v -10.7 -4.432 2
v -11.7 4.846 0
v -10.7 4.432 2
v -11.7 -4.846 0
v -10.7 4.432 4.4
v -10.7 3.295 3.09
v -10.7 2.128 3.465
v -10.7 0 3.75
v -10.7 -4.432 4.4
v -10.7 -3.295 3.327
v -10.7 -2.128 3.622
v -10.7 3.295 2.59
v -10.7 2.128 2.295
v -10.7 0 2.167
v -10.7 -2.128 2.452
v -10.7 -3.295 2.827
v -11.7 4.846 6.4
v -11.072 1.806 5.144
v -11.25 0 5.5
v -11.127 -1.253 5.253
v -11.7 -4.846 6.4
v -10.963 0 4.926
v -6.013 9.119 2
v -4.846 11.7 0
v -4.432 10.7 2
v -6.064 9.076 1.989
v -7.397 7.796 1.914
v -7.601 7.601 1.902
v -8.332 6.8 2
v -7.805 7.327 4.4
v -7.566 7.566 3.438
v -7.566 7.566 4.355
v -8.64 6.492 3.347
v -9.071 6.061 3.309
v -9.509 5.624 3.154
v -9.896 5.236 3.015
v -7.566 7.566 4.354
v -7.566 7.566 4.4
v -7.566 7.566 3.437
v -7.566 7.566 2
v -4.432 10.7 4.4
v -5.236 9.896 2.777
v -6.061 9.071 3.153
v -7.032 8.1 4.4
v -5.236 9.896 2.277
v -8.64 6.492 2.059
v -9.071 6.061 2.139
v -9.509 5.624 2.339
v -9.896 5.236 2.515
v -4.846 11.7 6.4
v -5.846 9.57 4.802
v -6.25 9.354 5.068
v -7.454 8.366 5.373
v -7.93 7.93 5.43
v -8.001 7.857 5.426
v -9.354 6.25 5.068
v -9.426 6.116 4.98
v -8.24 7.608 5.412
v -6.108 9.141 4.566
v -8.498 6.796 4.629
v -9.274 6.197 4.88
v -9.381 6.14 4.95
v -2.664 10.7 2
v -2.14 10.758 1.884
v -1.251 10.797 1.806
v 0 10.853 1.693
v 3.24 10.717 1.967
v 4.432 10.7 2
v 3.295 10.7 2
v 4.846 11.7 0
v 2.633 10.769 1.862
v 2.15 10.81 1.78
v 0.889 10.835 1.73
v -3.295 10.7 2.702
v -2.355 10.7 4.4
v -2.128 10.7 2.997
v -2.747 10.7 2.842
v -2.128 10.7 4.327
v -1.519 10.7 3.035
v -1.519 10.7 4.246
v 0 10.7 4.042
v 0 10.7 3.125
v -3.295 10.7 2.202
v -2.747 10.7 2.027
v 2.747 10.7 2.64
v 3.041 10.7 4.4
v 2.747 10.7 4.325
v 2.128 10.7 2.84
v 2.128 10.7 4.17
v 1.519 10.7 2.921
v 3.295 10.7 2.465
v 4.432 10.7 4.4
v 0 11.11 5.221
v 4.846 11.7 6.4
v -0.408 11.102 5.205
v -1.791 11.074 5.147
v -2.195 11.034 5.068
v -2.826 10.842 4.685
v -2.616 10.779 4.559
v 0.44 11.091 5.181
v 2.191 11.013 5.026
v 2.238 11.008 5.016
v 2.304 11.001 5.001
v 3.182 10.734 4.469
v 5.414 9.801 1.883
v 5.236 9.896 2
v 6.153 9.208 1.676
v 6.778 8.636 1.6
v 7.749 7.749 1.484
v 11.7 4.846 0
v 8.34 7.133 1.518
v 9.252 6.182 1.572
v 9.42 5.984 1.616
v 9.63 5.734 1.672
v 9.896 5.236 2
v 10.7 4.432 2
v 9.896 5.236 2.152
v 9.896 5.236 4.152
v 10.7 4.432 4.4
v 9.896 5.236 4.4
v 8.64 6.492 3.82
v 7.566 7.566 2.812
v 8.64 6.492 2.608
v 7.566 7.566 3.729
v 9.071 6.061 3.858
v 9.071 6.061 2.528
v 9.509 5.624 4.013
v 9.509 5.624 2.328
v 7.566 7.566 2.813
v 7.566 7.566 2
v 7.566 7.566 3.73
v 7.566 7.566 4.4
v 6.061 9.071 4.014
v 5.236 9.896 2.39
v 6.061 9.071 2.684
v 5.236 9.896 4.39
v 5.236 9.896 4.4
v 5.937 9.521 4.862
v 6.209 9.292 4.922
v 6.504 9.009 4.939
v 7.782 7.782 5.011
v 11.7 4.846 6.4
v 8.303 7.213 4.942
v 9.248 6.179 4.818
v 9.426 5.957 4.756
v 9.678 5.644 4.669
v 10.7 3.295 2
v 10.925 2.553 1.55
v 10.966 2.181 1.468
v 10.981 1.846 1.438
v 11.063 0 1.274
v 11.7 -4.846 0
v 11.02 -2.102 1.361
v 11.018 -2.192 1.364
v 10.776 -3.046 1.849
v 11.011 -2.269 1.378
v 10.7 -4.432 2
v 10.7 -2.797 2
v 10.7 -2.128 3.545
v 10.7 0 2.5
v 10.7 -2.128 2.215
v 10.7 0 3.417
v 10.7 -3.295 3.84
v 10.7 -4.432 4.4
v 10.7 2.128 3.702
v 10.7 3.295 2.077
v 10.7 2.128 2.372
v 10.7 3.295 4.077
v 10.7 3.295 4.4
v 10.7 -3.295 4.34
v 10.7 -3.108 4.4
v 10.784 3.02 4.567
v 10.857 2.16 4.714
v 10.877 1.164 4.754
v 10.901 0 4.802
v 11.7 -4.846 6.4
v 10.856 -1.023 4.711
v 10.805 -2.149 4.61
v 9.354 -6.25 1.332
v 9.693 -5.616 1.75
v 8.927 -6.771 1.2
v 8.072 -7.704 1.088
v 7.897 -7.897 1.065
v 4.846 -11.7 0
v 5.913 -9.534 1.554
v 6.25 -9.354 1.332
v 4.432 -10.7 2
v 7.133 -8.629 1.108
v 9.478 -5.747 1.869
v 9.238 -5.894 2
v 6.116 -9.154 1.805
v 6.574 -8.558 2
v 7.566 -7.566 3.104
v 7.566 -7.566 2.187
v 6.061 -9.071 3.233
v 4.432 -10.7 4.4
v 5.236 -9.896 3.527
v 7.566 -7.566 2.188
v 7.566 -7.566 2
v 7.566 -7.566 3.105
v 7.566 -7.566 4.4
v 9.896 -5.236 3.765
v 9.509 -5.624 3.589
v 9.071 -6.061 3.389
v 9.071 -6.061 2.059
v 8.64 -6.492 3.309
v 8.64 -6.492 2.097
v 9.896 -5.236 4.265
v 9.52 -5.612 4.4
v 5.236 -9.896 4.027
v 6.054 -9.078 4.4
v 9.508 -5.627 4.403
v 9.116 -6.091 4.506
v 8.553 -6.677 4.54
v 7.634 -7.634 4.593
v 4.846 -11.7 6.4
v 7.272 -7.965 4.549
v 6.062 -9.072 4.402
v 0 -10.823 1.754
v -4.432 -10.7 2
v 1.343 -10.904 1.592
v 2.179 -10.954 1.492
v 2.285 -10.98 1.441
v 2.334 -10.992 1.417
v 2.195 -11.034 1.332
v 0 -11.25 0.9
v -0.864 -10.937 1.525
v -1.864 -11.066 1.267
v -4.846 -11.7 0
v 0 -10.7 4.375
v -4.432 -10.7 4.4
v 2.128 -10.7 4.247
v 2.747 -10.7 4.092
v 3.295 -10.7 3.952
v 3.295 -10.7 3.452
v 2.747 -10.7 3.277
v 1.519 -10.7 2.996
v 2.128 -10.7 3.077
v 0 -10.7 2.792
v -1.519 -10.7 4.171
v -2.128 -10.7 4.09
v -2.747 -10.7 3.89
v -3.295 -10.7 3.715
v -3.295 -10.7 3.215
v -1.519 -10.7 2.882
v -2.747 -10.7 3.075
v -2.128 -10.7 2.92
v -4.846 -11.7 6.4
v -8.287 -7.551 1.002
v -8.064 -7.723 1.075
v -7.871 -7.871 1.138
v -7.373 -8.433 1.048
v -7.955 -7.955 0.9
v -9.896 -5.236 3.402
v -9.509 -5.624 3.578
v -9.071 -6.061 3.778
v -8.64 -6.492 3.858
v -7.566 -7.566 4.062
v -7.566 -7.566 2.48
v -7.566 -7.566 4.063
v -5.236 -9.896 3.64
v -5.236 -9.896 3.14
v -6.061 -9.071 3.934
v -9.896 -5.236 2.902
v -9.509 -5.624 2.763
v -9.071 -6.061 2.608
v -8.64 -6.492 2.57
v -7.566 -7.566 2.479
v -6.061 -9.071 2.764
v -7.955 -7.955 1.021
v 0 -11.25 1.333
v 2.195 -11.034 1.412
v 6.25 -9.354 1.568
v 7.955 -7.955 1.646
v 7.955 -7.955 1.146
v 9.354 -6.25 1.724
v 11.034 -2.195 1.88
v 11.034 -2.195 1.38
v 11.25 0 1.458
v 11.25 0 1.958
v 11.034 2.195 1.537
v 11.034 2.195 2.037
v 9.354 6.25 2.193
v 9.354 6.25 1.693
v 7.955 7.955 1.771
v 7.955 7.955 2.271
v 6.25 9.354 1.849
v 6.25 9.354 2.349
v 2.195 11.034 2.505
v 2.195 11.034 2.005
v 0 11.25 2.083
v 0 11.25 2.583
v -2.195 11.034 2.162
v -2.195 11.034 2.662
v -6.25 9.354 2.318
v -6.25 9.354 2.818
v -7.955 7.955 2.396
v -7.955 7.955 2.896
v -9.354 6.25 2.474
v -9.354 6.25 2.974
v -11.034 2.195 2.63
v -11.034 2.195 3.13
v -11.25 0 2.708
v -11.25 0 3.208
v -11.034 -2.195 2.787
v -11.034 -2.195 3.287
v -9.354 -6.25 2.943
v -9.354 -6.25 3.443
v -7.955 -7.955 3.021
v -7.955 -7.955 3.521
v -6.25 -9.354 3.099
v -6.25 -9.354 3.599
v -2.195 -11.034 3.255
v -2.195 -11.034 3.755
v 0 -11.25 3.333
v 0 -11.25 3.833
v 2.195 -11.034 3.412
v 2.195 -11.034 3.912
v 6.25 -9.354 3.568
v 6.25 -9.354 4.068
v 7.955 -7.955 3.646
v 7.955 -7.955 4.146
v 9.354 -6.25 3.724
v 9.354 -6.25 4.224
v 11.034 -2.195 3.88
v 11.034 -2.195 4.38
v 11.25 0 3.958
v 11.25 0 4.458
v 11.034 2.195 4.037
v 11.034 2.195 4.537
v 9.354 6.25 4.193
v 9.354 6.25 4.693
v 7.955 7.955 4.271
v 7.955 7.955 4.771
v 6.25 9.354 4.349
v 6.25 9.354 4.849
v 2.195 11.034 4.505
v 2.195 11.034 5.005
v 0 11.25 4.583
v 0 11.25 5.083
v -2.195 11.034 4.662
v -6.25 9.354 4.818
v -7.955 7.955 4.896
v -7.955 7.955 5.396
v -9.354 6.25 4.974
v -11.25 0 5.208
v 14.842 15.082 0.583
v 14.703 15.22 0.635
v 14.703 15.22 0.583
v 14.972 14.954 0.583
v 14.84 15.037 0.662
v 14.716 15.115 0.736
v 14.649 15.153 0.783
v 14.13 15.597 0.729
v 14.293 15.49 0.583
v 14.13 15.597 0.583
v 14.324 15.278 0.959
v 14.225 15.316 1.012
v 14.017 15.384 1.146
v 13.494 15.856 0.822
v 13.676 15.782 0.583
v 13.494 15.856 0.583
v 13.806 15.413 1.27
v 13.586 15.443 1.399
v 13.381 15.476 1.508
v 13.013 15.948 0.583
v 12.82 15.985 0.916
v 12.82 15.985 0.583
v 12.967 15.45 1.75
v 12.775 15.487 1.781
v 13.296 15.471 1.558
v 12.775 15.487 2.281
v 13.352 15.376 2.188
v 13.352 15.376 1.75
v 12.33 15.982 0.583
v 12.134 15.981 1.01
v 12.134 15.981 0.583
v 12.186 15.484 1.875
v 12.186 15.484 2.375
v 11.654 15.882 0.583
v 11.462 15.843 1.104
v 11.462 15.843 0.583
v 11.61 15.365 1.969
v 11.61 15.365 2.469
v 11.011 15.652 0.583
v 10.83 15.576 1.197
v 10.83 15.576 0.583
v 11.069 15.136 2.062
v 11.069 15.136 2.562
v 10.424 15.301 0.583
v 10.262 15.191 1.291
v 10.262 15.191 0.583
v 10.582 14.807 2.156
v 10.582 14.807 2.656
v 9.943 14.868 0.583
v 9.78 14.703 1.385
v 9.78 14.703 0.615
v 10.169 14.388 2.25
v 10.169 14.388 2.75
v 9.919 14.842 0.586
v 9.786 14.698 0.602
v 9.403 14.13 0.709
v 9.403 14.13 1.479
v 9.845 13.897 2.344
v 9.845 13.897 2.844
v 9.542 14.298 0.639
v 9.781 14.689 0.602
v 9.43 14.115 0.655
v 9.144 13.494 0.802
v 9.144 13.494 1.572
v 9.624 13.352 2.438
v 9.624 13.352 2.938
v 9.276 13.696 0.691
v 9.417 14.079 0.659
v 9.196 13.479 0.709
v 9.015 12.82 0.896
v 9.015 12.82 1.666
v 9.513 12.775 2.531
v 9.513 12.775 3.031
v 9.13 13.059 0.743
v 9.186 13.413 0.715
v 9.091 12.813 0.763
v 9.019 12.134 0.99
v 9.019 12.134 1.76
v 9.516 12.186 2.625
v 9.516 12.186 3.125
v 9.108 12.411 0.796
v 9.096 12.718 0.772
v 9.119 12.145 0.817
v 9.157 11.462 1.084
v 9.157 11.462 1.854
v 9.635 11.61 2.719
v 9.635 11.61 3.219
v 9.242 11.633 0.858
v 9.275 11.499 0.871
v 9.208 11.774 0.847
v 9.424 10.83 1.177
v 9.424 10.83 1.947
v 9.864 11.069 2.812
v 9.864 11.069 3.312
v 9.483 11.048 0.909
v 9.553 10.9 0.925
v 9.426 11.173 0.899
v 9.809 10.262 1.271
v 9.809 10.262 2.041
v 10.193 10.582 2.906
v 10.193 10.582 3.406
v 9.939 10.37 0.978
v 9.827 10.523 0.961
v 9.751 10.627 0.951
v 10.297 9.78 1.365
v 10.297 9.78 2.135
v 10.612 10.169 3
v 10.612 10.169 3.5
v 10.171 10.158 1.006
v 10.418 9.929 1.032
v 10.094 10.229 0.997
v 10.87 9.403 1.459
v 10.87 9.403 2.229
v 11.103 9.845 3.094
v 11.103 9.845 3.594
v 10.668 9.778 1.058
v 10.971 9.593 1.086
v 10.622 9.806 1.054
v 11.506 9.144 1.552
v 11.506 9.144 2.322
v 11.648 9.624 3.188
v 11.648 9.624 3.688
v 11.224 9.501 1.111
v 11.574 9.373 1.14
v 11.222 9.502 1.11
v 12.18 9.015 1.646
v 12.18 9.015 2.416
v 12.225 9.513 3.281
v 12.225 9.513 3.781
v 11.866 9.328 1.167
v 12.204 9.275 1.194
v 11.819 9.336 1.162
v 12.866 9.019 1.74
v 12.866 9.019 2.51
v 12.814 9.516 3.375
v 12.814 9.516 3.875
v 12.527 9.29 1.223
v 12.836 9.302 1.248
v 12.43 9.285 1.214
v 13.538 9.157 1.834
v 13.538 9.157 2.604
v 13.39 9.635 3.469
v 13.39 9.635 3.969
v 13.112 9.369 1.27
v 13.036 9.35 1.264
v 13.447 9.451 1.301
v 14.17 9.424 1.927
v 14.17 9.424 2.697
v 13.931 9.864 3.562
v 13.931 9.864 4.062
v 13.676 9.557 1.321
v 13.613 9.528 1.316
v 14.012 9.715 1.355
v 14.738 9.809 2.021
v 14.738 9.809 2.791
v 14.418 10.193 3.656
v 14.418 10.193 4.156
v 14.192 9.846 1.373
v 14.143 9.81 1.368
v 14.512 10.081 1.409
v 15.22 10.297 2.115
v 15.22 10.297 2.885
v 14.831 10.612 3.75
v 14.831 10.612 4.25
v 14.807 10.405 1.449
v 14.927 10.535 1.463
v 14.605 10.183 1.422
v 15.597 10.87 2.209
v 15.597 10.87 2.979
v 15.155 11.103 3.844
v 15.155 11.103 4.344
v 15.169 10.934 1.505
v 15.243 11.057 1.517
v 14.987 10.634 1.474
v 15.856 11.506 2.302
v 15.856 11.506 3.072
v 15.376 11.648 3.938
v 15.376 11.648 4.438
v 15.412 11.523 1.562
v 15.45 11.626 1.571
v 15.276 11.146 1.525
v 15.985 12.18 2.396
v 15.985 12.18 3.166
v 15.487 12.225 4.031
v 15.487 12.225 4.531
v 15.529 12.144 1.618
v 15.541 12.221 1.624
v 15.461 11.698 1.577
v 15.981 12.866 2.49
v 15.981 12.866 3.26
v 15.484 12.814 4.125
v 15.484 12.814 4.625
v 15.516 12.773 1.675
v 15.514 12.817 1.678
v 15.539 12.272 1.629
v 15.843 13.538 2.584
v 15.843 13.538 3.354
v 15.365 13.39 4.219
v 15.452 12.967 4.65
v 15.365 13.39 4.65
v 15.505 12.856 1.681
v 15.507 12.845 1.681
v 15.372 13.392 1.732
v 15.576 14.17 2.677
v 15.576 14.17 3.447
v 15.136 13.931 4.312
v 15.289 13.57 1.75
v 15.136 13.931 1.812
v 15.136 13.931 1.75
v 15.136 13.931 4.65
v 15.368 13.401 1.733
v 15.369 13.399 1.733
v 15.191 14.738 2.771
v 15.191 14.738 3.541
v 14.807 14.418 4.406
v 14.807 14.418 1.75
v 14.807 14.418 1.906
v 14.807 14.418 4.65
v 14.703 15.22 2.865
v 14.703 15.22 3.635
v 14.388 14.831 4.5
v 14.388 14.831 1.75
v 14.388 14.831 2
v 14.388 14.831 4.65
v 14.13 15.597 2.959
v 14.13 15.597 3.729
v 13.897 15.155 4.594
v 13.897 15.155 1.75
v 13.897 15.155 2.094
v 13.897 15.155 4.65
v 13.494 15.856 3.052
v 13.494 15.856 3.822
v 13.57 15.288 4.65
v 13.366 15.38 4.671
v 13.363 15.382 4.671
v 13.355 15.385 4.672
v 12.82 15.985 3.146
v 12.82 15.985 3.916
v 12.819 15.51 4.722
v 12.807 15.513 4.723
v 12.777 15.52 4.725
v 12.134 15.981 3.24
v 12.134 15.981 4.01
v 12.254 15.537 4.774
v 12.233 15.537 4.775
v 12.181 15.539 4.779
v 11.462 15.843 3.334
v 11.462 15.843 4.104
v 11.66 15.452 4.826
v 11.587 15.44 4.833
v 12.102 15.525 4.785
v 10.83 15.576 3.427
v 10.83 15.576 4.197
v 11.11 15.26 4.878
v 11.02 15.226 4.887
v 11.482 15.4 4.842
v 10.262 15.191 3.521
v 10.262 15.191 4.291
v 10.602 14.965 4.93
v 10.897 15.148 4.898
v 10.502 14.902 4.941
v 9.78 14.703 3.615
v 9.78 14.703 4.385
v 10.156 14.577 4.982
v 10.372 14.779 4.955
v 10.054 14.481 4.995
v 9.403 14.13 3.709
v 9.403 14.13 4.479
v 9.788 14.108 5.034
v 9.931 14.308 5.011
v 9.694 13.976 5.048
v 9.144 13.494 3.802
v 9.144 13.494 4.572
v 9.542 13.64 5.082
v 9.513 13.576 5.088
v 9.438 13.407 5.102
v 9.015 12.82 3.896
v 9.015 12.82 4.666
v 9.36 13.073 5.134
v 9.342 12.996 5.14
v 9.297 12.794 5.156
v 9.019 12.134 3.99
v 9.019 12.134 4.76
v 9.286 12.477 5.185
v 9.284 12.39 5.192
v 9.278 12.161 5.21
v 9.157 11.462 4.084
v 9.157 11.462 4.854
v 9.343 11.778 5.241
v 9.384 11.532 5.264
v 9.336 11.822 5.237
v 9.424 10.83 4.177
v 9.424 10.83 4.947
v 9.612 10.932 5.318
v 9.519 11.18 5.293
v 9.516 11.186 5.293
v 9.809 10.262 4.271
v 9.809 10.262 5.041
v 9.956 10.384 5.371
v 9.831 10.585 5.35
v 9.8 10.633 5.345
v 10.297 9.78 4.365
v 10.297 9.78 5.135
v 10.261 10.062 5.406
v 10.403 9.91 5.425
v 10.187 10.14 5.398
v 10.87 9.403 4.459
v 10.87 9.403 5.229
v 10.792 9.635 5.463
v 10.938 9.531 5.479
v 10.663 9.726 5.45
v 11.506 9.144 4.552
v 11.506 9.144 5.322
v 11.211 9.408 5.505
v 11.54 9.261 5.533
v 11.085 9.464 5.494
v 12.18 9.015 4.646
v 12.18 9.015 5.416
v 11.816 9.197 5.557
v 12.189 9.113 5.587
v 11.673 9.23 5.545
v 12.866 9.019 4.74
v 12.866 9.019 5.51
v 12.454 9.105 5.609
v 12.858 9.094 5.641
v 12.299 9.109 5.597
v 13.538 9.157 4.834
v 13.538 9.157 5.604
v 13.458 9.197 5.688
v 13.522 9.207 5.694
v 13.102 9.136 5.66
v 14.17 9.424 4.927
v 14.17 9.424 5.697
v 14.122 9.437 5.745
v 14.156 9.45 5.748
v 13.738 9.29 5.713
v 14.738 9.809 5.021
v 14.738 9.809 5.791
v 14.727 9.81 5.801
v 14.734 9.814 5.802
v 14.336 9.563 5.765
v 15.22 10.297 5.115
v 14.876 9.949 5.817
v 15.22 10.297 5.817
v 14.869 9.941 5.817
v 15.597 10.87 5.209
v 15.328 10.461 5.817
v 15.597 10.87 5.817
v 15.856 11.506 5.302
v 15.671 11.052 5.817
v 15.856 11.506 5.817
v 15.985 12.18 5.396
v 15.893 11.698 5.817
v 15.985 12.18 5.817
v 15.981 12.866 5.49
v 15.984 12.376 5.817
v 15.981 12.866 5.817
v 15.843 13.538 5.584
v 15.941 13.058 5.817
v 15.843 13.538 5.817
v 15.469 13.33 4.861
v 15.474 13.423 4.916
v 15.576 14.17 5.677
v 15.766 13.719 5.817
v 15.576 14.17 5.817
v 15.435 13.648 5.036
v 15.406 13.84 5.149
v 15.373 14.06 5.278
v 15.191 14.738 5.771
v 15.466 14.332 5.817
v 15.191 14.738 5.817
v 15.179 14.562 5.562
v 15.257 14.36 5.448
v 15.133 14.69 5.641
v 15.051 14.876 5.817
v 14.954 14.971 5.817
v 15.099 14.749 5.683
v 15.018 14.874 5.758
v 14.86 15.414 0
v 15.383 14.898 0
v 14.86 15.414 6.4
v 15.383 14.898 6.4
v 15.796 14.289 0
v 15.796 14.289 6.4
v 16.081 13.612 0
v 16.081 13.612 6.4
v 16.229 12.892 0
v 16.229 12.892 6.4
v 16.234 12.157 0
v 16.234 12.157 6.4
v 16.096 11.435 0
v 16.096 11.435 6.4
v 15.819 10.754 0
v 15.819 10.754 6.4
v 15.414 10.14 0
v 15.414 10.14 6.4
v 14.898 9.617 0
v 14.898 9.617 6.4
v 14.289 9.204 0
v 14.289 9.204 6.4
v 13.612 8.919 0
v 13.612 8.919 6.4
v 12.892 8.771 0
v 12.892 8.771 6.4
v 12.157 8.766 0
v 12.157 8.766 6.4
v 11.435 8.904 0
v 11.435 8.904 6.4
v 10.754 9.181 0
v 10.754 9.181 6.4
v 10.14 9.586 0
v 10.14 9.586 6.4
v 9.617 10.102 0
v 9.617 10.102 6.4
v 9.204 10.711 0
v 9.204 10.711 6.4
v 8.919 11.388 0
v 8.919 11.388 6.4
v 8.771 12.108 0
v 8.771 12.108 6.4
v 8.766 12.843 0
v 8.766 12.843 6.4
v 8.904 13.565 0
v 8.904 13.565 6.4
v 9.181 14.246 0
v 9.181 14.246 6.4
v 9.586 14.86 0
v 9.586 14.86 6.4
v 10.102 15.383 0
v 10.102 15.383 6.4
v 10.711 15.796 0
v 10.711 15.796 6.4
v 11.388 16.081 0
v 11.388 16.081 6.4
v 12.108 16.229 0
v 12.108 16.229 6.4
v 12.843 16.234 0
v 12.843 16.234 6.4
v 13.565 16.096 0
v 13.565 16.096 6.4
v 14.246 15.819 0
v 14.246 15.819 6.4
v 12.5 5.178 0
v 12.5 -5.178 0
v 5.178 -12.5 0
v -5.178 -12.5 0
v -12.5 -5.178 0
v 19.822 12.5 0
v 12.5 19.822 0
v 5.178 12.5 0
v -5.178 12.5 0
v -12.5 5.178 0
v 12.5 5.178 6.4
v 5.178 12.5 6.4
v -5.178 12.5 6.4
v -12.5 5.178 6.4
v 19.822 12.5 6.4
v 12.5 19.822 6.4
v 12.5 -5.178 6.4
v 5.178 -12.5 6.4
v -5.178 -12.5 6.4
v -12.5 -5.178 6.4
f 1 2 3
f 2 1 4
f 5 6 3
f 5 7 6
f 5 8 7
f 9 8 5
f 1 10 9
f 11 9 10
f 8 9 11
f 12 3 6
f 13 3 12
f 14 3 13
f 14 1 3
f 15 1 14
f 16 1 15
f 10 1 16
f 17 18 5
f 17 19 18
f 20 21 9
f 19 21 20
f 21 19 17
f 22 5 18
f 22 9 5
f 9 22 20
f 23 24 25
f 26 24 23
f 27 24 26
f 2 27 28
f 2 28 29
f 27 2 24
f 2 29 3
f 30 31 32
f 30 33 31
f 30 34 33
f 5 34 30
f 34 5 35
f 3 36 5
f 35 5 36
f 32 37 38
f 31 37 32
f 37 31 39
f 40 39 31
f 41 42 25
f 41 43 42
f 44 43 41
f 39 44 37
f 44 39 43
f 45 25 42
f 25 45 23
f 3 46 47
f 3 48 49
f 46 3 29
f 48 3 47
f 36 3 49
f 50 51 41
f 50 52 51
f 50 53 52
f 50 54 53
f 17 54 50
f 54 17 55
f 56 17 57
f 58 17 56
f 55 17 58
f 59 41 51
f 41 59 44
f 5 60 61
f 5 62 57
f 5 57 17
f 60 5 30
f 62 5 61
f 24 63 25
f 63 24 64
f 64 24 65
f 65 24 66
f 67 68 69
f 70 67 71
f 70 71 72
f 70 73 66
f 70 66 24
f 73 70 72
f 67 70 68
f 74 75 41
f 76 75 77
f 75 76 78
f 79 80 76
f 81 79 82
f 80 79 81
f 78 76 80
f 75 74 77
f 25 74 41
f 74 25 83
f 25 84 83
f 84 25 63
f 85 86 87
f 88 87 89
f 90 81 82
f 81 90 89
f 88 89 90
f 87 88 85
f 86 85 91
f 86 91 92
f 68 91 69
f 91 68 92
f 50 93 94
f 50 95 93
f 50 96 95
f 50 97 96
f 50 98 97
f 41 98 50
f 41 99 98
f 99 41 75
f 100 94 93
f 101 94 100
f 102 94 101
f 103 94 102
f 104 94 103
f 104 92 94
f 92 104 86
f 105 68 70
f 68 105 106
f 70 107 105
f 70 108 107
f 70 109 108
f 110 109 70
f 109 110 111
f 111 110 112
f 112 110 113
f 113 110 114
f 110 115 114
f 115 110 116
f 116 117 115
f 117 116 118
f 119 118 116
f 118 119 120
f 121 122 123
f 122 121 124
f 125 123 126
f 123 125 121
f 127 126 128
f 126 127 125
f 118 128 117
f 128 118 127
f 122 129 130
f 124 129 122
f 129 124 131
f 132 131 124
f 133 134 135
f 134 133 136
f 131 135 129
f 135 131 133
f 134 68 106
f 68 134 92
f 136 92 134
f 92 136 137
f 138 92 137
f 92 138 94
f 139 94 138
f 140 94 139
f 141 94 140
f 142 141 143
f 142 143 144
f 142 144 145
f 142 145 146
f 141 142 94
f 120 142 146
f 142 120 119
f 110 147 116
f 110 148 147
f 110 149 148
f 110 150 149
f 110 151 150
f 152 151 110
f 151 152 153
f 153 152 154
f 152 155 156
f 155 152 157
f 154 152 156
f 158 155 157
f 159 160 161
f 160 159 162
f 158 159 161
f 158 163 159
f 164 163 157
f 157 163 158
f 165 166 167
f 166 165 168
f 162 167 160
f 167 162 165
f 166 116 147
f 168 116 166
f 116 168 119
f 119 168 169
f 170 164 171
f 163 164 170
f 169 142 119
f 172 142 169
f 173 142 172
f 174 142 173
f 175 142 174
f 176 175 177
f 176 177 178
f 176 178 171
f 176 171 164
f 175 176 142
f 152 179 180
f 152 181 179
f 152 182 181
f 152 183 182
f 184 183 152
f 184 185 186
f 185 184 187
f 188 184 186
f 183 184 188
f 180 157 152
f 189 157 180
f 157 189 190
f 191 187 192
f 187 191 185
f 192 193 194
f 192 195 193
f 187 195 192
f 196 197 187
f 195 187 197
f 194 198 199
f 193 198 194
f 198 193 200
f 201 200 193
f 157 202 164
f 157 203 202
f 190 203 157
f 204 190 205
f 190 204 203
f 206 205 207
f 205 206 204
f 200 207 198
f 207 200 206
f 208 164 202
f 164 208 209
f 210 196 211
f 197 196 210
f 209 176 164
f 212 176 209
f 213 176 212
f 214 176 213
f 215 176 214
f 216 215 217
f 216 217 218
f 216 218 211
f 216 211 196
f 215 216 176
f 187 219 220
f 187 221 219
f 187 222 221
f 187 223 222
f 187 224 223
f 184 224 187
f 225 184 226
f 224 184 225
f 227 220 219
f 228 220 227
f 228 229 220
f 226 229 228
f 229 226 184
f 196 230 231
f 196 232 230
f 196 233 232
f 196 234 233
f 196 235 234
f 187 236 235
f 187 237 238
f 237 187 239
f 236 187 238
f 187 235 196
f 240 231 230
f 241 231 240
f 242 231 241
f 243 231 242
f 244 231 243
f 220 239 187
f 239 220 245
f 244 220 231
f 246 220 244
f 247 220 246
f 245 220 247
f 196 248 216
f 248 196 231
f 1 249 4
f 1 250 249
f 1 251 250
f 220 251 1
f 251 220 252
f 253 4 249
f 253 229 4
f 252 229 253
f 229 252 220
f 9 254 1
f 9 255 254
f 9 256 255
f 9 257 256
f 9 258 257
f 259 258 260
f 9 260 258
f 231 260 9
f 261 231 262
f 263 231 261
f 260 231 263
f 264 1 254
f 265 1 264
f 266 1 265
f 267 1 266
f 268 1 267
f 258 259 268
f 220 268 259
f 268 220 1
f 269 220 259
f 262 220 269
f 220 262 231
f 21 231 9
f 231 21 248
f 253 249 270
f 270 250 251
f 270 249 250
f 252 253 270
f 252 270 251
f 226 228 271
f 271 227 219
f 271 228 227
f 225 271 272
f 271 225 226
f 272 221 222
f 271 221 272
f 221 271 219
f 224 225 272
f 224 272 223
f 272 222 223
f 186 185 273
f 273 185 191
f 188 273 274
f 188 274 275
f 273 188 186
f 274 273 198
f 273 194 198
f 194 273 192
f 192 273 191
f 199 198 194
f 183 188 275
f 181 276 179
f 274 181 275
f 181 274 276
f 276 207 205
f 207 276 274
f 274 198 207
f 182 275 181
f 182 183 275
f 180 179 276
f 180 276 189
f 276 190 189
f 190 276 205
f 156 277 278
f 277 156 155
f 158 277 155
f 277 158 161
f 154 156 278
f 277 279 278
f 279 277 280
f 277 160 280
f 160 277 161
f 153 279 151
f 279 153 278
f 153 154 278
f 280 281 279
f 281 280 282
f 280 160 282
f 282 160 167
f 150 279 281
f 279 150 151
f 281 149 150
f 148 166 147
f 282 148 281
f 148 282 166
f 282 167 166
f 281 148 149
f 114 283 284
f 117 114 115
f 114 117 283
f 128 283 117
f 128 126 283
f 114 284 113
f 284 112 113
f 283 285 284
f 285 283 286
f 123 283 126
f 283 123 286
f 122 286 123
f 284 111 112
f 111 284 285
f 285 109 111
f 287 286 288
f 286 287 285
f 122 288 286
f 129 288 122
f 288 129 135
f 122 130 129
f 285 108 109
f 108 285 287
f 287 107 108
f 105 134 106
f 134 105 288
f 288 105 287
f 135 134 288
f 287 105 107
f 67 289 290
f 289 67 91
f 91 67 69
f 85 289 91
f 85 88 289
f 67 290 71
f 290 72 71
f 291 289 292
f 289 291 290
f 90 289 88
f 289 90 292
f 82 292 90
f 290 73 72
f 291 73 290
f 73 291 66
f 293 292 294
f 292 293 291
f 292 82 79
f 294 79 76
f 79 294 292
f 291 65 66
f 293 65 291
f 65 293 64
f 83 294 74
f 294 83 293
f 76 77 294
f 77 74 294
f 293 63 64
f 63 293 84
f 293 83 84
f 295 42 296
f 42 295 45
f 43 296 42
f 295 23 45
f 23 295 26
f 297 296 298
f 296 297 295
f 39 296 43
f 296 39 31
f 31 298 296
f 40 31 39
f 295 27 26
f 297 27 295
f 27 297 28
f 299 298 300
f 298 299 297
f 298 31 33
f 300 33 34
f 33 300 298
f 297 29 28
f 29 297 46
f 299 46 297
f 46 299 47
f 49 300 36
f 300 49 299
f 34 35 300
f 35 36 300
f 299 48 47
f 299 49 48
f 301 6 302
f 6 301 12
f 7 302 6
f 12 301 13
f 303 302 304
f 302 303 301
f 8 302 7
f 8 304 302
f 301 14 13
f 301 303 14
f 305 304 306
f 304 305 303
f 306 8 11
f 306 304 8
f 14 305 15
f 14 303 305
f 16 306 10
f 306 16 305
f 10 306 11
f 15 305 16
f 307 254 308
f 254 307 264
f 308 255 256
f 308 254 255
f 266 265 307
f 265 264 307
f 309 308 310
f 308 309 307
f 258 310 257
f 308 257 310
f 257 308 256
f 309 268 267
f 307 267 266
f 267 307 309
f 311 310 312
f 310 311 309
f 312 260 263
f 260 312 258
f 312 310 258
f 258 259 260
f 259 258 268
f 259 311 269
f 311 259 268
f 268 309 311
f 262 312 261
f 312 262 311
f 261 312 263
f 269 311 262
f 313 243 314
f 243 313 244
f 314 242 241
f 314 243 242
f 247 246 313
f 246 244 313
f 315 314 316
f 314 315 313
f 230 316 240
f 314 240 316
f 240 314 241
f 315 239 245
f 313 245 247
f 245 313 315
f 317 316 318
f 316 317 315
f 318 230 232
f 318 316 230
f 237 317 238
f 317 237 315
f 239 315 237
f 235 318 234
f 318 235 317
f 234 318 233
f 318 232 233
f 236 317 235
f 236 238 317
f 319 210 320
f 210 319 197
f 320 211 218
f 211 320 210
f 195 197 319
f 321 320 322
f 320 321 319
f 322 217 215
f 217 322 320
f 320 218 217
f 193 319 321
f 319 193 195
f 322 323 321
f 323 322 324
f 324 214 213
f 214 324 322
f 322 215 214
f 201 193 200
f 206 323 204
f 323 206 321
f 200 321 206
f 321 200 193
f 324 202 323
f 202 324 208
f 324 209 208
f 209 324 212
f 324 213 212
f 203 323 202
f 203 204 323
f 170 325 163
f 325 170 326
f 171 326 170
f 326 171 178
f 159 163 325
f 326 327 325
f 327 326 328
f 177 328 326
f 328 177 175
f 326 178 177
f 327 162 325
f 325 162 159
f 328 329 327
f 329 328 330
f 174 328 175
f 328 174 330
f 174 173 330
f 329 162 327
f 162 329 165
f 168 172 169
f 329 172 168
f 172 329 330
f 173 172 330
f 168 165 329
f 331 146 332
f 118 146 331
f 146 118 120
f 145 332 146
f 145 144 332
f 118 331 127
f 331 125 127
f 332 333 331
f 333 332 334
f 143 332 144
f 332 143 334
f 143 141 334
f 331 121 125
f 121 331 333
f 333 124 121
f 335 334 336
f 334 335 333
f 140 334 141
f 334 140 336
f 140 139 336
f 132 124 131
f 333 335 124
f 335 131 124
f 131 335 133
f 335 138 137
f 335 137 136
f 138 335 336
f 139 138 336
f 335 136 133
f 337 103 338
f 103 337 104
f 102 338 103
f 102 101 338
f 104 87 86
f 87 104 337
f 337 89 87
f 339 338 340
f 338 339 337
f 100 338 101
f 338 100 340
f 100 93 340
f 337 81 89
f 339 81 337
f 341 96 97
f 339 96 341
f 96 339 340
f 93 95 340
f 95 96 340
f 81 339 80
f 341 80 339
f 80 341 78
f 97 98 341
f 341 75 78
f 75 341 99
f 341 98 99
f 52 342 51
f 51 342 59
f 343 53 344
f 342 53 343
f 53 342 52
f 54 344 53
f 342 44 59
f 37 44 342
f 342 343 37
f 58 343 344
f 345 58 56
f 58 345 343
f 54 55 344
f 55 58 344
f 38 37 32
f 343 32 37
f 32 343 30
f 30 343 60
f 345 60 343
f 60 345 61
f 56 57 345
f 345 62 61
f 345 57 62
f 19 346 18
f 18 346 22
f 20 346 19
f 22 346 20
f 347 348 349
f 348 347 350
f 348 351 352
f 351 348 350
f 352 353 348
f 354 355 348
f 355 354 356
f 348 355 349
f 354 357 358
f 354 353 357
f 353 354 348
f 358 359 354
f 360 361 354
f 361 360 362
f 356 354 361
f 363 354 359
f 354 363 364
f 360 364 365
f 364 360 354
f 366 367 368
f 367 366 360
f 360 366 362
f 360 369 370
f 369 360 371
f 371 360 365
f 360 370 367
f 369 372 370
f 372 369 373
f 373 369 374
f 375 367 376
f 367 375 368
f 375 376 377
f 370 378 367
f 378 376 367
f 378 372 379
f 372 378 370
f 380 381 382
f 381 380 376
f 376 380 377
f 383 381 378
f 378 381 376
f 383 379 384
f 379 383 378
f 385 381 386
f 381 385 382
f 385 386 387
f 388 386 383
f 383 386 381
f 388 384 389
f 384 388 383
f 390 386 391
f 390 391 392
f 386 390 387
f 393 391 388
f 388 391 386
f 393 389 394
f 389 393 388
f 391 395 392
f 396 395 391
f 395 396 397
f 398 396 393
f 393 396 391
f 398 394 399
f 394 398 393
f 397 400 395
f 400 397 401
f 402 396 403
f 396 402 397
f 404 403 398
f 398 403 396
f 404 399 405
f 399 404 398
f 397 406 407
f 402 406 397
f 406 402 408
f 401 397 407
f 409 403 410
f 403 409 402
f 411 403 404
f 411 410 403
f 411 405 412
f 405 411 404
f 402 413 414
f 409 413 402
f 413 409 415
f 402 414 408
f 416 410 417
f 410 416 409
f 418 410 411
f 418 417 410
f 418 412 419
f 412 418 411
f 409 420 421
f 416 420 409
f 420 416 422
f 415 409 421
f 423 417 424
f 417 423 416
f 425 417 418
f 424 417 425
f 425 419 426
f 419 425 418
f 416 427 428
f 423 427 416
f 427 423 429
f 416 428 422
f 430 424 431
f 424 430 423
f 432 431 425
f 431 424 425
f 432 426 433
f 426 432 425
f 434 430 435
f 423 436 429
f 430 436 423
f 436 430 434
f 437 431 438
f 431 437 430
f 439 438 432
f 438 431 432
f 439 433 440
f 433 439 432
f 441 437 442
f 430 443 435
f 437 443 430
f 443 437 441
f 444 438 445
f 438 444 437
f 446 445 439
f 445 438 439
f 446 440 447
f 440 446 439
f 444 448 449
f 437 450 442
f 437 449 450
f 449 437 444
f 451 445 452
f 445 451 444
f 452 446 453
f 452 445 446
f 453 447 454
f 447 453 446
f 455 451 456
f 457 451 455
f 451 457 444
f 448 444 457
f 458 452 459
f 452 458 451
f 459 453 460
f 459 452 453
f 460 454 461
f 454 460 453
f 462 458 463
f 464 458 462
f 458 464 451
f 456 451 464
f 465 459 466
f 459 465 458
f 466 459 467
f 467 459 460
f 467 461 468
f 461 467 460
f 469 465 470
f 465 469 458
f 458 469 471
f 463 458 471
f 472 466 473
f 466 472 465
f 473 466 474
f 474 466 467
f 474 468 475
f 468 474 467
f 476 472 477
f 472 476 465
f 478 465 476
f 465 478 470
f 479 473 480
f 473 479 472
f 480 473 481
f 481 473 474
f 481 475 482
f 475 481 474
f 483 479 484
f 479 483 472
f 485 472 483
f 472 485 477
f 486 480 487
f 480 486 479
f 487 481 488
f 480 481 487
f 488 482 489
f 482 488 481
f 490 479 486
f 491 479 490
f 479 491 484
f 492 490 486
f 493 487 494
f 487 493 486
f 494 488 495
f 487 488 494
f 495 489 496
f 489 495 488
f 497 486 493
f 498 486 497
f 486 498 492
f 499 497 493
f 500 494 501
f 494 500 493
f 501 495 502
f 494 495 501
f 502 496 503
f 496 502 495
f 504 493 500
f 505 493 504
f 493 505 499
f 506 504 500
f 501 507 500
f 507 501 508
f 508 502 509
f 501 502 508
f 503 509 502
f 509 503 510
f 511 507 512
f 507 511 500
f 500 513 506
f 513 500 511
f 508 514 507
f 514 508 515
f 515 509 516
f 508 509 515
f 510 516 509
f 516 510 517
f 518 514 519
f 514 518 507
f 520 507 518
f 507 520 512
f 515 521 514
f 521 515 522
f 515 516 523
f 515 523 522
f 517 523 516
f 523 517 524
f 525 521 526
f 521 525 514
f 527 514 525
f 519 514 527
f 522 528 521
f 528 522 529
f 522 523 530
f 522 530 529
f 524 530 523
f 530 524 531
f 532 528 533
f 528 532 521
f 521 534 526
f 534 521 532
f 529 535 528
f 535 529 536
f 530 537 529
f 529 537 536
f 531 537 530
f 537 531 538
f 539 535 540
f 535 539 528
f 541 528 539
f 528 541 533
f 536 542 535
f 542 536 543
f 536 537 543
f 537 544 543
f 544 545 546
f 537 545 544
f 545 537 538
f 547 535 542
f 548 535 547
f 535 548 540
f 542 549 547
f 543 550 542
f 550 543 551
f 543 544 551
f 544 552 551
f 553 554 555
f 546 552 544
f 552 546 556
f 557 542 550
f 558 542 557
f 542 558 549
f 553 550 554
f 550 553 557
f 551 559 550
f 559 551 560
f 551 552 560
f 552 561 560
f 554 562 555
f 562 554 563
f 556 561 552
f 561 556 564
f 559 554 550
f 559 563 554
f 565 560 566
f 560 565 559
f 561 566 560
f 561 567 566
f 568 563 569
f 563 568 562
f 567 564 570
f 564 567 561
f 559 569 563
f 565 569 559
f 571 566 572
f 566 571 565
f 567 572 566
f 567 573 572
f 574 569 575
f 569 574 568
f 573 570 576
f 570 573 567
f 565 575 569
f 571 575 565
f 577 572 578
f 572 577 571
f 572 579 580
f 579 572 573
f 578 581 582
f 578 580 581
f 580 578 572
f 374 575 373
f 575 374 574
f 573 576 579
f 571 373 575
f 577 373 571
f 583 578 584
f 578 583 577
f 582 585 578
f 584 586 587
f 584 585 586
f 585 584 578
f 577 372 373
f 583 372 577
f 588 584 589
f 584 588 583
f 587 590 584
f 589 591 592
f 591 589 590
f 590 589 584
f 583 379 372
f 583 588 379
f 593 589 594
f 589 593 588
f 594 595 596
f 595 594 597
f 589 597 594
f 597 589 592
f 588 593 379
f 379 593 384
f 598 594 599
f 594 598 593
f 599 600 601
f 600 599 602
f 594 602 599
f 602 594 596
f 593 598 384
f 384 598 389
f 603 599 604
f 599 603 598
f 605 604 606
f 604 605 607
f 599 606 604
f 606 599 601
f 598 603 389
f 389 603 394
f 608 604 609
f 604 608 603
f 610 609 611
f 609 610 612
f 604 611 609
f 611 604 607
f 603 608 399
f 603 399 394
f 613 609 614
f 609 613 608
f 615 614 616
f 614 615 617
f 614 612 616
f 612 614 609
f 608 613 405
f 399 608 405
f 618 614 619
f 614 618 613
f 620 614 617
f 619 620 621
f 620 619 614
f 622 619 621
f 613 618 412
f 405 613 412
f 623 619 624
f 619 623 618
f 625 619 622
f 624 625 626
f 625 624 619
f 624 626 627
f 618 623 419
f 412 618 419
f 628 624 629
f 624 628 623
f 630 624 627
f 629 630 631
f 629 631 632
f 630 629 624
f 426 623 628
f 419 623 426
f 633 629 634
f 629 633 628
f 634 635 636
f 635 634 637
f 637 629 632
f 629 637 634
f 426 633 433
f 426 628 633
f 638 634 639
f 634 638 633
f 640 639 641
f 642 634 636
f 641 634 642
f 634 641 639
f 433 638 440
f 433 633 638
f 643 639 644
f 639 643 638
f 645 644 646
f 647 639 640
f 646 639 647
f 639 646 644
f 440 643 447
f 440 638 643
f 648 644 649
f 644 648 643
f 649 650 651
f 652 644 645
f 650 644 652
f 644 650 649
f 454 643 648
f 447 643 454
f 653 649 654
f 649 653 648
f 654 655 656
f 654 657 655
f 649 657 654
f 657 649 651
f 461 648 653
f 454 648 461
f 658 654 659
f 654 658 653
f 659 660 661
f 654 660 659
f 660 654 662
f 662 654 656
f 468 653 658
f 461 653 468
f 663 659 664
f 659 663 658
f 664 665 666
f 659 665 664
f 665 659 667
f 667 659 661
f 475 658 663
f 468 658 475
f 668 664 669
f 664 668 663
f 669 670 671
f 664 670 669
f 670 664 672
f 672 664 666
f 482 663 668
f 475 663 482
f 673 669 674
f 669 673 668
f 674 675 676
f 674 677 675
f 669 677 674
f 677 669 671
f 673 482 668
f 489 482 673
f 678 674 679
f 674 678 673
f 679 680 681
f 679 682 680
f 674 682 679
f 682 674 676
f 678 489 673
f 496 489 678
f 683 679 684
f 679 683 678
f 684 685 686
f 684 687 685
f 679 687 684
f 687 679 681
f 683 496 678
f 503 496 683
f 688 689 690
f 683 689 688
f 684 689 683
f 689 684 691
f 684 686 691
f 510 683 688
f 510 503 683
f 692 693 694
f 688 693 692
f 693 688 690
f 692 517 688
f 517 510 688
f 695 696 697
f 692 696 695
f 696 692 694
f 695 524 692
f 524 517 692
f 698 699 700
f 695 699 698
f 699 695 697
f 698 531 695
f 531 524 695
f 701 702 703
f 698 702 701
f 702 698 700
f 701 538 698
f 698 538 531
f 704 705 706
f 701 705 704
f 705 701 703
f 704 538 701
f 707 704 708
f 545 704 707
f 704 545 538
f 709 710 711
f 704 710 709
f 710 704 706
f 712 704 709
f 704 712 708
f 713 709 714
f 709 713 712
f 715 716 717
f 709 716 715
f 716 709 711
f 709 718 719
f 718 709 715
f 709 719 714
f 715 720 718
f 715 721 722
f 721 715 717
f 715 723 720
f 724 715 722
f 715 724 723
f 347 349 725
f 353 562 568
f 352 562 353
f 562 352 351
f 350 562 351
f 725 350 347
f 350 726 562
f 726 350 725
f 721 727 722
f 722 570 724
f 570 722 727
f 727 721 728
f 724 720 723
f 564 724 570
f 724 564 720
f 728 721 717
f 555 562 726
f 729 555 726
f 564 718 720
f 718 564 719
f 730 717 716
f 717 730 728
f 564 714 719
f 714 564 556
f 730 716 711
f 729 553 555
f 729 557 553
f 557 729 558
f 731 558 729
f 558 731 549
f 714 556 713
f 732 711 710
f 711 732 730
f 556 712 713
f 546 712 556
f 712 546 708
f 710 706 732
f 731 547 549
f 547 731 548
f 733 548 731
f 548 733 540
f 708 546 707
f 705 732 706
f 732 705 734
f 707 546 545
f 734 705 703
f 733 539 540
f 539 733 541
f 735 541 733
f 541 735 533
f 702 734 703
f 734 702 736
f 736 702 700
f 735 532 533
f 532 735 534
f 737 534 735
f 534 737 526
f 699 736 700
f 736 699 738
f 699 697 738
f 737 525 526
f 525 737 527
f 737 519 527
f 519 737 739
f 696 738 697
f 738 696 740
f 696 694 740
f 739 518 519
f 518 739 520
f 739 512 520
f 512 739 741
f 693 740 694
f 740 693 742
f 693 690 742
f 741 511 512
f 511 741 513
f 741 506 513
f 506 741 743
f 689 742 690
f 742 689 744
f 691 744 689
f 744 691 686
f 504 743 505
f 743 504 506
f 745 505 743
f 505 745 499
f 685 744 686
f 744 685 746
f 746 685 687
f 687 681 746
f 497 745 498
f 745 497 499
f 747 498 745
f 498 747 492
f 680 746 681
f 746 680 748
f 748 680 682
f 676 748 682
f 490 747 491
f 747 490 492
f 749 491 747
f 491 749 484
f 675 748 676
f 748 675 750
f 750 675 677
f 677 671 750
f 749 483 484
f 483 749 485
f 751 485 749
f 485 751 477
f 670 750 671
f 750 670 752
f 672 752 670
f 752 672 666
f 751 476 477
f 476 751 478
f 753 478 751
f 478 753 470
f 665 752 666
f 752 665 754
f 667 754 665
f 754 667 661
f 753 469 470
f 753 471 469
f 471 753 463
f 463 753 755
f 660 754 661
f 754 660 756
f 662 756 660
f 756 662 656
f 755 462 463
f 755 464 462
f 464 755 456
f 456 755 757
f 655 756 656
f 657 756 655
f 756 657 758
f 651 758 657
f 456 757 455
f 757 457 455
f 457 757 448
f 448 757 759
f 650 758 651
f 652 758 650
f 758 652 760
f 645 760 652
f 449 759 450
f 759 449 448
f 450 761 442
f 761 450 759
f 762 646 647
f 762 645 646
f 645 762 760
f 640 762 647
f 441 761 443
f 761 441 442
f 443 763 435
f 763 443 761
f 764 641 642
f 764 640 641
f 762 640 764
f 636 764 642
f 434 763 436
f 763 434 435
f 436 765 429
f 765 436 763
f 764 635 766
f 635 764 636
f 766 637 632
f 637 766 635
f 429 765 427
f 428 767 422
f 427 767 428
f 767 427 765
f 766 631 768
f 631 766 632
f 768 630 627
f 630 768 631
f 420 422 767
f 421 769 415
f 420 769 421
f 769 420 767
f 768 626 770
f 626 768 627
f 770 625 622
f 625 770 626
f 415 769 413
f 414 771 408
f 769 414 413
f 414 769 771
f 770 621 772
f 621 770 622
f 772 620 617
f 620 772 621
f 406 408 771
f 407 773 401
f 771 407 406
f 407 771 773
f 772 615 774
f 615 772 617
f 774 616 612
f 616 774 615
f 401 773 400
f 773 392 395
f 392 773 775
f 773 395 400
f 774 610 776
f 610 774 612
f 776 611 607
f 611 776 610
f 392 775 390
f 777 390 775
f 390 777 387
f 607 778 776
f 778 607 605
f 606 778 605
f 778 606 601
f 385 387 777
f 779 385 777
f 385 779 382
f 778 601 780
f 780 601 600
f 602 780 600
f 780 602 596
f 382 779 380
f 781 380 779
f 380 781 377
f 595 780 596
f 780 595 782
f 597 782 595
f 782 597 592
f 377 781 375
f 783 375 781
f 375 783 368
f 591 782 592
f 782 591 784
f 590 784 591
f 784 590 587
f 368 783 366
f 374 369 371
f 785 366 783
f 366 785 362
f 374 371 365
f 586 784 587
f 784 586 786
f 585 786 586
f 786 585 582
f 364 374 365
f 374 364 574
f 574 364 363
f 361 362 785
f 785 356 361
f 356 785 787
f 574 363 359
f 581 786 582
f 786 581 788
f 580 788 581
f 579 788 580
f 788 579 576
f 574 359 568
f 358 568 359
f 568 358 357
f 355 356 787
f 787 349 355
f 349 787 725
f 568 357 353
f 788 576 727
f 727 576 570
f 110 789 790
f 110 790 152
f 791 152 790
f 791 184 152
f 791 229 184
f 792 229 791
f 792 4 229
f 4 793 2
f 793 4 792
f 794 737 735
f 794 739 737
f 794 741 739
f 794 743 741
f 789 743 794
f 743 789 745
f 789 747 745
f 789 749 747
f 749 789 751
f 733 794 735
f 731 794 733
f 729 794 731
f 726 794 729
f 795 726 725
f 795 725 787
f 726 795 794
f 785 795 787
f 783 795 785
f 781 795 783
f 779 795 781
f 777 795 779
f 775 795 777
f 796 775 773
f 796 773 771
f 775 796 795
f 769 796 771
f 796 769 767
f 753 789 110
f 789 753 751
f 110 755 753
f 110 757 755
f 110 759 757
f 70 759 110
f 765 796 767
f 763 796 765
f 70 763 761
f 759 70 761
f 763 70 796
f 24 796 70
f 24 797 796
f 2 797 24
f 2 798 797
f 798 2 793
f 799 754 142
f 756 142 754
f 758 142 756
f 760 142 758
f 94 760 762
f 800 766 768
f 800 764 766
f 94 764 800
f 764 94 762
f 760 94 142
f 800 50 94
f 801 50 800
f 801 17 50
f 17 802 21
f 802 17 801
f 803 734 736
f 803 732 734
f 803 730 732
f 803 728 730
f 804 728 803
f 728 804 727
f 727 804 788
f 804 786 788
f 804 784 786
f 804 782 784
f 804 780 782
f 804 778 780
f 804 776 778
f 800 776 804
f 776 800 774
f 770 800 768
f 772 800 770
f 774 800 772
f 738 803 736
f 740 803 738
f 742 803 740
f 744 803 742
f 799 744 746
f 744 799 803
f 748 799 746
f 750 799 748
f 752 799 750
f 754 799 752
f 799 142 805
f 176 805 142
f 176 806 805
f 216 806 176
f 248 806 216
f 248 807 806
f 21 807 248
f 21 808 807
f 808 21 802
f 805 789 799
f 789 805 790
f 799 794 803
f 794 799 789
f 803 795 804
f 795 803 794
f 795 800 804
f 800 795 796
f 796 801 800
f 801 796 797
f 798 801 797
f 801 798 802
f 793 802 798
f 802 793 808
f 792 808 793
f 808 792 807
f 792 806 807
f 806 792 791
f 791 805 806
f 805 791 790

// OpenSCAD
use <multiboard_base.scad>

// This should be the same alignment as the .STEP remixing files.
translate([-12.5, -12.5, 0])
multiboard_cell(true);
